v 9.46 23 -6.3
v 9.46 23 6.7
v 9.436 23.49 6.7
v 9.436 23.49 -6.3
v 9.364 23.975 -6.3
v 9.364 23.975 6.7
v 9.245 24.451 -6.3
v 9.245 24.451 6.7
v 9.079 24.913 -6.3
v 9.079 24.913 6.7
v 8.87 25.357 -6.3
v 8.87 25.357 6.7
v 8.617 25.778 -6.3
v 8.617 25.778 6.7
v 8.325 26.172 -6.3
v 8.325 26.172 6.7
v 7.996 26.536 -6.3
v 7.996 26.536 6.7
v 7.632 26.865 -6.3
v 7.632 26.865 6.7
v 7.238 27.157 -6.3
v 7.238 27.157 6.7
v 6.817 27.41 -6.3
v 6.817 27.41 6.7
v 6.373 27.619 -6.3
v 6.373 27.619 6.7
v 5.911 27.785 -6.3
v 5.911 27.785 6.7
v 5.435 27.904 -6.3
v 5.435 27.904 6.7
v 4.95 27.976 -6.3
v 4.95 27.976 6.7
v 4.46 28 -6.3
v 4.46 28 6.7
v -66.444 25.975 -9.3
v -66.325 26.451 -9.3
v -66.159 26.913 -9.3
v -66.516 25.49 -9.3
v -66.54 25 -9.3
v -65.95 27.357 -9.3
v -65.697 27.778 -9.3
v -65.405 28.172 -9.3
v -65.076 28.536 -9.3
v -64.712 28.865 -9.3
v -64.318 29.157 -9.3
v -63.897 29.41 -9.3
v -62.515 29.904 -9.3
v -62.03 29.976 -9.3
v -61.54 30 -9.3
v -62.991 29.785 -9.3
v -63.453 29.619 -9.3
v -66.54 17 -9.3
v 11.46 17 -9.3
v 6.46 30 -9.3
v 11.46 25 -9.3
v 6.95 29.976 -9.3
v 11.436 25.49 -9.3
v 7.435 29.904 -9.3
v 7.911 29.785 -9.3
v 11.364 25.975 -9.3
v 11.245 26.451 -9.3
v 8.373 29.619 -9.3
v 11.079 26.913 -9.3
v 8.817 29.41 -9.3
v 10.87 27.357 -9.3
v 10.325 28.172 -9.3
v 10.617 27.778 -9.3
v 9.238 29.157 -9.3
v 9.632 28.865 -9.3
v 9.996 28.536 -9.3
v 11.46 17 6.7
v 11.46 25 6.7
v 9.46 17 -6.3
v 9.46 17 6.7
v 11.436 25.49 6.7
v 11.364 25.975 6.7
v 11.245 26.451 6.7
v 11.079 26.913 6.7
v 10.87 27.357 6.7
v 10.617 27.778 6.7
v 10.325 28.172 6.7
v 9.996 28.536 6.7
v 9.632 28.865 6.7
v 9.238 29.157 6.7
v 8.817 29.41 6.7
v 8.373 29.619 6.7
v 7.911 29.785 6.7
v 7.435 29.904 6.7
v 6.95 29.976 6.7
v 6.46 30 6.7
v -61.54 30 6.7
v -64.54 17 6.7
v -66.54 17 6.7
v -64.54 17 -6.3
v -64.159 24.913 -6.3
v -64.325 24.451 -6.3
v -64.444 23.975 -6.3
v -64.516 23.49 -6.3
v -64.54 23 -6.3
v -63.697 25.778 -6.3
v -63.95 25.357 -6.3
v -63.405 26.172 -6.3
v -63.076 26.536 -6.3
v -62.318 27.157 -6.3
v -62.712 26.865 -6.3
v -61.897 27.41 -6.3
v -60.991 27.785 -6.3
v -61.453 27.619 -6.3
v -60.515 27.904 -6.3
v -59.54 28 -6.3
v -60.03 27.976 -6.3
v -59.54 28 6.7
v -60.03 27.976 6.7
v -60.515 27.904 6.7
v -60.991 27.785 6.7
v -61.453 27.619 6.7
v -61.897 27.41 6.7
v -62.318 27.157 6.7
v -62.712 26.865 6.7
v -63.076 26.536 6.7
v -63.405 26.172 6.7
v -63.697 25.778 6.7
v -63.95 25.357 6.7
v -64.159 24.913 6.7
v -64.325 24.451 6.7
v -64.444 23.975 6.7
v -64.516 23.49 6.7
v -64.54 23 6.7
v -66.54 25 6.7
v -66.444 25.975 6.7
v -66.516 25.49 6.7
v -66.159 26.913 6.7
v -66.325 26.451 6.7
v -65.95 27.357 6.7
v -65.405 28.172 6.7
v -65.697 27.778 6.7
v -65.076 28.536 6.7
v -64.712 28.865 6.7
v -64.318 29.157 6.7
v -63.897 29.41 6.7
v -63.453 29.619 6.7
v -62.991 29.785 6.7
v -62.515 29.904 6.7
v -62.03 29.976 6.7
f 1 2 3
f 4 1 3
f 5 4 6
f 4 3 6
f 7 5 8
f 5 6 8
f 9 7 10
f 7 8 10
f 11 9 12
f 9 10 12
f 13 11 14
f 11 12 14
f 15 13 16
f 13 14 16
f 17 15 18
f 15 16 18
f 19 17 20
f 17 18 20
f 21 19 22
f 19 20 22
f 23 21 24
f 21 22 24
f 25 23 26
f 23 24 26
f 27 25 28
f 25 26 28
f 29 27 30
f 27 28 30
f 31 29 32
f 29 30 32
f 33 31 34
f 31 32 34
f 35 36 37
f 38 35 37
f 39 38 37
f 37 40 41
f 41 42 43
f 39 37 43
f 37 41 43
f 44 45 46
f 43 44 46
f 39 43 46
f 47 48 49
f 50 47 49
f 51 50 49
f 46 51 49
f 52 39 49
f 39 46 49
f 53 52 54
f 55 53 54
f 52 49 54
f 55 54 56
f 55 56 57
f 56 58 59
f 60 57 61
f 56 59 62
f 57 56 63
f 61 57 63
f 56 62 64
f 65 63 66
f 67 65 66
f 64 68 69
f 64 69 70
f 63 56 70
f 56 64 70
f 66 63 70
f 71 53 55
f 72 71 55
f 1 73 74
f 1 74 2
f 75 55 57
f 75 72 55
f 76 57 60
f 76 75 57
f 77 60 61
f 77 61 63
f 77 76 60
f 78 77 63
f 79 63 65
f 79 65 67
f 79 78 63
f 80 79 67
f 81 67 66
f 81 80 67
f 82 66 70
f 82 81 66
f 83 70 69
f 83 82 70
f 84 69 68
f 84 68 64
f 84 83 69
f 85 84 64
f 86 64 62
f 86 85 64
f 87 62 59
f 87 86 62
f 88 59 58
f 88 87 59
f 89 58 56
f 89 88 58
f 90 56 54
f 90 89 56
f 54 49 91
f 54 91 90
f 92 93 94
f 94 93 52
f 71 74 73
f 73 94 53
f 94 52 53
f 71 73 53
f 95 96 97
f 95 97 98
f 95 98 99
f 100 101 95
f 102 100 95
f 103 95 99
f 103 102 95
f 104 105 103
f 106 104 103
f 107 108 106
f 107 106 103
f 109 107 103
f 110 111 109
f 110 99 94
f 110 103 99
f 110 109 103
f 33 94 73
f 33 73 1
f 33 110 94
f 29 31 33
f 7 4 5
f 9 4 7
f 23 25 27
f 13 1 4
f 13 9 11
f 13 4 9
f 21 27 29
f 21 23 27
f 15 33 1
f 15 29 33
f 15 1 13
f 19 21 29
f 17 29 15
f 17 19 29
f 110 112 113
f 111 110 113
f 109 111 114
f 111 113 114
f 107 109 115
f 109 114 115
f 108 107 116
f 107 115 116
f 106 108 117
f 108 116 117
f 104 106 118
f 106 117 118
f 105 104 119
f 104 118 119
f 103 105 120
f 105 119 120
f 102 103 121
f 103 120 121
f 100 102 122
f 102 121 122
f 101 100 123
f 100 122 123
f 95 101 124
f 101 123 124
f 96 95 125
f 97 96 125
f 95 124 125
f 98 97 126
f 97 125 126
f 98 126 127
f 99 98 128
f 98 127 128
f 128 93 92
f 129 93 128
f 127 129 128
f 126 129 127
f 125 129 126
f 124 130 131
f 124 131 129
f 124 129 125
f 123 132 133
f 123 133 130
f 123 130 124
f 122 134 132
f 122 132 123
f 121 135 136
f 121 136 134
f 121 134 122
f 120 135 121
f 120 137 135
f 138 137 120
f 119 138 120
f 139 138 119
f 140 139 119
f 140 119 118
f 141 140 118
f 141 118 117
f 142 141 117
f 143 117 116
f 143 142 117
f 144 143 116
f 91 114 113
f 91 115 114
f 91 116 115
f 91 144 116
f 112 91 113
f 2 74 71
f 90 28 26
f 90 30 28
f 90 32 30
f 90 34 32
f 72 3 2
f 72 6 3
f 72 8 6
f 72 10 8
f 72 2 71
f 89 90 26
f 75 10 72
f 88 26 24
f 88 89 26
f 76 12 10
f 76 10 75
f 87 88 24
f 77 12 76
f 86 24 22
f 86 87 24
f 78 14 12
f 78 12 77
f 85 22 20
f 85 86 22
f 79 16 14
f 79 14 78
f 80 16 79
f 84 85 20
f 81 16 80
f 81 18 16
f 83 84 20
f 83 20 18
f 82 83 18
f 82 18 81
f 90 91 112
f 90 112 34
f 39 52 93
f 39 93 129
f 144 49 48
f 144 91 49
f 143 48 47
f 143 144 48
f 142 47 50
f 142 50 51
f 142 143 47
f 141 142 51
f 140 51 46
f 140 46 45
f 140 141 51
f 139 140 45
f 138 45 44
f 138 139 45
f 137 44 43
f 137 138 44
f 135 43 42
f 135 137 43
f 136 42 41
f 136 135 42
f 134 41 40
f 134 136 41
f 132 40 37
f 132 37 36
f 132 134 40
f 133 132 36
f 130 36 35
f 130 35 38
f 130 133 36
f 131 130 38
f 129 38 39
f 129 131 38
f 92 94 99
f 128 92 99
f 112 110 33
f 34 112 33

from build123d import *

# Parameters (mm, degrees)
BOX001_W     = 74
BOX001_H     = 13
BOX001_DEPTH = 14
FILLET007_R  = 5
FILLET008_R  = 5
BOX_W        = 78
BOX_H        = 13
BOX_DEPTH    = 16
FILLET_R     = 5
FILLET006_R  = 5


with BuildPart() as fillet008:
    # Box001 → Box001 (new body)
    with BuildSketch(Plane(origin=(-65, 17, -11.5), x_dir=(1, 0, 0), z_dir=(0, 0, 1))):
        with Locations((37, 6.5)):
            Rectangle(BOX001_W, BOX001_H)
    extrude(amount=BOX001_DEPTH)

    # Fillet007
    fillet007_edges = [fillet008.edges().sort_by_distance(p)[0] for p in [
        (9, 30, -4.5),
    ]]
    fillet(fillet007_edges, radius=FILLET007_R)

    # Fillet008
    fillet008_edges = [fillet008.edges().sort_by_distance(p)[0] for p in [
        (-65, 30, -4.5),
    ]]
    fillet(fillet008_edges, radius=FILLET008_R)


with BuildPart() as fillet008_1:
    # Fillet008 placement: moved
    add(fillet008.part.moved(Location((2, -2, 1))))


with BuildPart() as i2c_hosting:
    # Box → Box (new body)
    with BuildSketch(Plane(origin=(-65, 17, -13.5), x_dir=(1, 0, 0), z_dir=(0, 0, 1))):
        with Locations((39, 6.5)):
            Rectangle(BOX_W, BOX_H)
    extrude(amount=BOX_DEPTH)

    # Fillet
    fillet_edges = [i2c_hosting.edges().sort_by_distance(p)[0] for p in [
        (13, 30, -5.5),
    ]]
    fillet(fillet_edges, radius=FILLET_R)

    # Fillet006
    fillet006_edges = [i2c_hosting.edges().sort_by_distance(p)[0] for p in [
        (-65, 30, -5.5),
    ]]
    fillet(fillet006_edges, radius=FILLET006_R)

    # Cut: cut Fillet008
    add(fillet008_1.part, mode=Mode.SUBTRACT)


with BuildPart() as i2c_hosting_1:
    # Cut placement: moved
    add(i2c_hosting.part.moved(Location((-1.54, 0, 4.2))))


solid = i2c_hosting_1.part
